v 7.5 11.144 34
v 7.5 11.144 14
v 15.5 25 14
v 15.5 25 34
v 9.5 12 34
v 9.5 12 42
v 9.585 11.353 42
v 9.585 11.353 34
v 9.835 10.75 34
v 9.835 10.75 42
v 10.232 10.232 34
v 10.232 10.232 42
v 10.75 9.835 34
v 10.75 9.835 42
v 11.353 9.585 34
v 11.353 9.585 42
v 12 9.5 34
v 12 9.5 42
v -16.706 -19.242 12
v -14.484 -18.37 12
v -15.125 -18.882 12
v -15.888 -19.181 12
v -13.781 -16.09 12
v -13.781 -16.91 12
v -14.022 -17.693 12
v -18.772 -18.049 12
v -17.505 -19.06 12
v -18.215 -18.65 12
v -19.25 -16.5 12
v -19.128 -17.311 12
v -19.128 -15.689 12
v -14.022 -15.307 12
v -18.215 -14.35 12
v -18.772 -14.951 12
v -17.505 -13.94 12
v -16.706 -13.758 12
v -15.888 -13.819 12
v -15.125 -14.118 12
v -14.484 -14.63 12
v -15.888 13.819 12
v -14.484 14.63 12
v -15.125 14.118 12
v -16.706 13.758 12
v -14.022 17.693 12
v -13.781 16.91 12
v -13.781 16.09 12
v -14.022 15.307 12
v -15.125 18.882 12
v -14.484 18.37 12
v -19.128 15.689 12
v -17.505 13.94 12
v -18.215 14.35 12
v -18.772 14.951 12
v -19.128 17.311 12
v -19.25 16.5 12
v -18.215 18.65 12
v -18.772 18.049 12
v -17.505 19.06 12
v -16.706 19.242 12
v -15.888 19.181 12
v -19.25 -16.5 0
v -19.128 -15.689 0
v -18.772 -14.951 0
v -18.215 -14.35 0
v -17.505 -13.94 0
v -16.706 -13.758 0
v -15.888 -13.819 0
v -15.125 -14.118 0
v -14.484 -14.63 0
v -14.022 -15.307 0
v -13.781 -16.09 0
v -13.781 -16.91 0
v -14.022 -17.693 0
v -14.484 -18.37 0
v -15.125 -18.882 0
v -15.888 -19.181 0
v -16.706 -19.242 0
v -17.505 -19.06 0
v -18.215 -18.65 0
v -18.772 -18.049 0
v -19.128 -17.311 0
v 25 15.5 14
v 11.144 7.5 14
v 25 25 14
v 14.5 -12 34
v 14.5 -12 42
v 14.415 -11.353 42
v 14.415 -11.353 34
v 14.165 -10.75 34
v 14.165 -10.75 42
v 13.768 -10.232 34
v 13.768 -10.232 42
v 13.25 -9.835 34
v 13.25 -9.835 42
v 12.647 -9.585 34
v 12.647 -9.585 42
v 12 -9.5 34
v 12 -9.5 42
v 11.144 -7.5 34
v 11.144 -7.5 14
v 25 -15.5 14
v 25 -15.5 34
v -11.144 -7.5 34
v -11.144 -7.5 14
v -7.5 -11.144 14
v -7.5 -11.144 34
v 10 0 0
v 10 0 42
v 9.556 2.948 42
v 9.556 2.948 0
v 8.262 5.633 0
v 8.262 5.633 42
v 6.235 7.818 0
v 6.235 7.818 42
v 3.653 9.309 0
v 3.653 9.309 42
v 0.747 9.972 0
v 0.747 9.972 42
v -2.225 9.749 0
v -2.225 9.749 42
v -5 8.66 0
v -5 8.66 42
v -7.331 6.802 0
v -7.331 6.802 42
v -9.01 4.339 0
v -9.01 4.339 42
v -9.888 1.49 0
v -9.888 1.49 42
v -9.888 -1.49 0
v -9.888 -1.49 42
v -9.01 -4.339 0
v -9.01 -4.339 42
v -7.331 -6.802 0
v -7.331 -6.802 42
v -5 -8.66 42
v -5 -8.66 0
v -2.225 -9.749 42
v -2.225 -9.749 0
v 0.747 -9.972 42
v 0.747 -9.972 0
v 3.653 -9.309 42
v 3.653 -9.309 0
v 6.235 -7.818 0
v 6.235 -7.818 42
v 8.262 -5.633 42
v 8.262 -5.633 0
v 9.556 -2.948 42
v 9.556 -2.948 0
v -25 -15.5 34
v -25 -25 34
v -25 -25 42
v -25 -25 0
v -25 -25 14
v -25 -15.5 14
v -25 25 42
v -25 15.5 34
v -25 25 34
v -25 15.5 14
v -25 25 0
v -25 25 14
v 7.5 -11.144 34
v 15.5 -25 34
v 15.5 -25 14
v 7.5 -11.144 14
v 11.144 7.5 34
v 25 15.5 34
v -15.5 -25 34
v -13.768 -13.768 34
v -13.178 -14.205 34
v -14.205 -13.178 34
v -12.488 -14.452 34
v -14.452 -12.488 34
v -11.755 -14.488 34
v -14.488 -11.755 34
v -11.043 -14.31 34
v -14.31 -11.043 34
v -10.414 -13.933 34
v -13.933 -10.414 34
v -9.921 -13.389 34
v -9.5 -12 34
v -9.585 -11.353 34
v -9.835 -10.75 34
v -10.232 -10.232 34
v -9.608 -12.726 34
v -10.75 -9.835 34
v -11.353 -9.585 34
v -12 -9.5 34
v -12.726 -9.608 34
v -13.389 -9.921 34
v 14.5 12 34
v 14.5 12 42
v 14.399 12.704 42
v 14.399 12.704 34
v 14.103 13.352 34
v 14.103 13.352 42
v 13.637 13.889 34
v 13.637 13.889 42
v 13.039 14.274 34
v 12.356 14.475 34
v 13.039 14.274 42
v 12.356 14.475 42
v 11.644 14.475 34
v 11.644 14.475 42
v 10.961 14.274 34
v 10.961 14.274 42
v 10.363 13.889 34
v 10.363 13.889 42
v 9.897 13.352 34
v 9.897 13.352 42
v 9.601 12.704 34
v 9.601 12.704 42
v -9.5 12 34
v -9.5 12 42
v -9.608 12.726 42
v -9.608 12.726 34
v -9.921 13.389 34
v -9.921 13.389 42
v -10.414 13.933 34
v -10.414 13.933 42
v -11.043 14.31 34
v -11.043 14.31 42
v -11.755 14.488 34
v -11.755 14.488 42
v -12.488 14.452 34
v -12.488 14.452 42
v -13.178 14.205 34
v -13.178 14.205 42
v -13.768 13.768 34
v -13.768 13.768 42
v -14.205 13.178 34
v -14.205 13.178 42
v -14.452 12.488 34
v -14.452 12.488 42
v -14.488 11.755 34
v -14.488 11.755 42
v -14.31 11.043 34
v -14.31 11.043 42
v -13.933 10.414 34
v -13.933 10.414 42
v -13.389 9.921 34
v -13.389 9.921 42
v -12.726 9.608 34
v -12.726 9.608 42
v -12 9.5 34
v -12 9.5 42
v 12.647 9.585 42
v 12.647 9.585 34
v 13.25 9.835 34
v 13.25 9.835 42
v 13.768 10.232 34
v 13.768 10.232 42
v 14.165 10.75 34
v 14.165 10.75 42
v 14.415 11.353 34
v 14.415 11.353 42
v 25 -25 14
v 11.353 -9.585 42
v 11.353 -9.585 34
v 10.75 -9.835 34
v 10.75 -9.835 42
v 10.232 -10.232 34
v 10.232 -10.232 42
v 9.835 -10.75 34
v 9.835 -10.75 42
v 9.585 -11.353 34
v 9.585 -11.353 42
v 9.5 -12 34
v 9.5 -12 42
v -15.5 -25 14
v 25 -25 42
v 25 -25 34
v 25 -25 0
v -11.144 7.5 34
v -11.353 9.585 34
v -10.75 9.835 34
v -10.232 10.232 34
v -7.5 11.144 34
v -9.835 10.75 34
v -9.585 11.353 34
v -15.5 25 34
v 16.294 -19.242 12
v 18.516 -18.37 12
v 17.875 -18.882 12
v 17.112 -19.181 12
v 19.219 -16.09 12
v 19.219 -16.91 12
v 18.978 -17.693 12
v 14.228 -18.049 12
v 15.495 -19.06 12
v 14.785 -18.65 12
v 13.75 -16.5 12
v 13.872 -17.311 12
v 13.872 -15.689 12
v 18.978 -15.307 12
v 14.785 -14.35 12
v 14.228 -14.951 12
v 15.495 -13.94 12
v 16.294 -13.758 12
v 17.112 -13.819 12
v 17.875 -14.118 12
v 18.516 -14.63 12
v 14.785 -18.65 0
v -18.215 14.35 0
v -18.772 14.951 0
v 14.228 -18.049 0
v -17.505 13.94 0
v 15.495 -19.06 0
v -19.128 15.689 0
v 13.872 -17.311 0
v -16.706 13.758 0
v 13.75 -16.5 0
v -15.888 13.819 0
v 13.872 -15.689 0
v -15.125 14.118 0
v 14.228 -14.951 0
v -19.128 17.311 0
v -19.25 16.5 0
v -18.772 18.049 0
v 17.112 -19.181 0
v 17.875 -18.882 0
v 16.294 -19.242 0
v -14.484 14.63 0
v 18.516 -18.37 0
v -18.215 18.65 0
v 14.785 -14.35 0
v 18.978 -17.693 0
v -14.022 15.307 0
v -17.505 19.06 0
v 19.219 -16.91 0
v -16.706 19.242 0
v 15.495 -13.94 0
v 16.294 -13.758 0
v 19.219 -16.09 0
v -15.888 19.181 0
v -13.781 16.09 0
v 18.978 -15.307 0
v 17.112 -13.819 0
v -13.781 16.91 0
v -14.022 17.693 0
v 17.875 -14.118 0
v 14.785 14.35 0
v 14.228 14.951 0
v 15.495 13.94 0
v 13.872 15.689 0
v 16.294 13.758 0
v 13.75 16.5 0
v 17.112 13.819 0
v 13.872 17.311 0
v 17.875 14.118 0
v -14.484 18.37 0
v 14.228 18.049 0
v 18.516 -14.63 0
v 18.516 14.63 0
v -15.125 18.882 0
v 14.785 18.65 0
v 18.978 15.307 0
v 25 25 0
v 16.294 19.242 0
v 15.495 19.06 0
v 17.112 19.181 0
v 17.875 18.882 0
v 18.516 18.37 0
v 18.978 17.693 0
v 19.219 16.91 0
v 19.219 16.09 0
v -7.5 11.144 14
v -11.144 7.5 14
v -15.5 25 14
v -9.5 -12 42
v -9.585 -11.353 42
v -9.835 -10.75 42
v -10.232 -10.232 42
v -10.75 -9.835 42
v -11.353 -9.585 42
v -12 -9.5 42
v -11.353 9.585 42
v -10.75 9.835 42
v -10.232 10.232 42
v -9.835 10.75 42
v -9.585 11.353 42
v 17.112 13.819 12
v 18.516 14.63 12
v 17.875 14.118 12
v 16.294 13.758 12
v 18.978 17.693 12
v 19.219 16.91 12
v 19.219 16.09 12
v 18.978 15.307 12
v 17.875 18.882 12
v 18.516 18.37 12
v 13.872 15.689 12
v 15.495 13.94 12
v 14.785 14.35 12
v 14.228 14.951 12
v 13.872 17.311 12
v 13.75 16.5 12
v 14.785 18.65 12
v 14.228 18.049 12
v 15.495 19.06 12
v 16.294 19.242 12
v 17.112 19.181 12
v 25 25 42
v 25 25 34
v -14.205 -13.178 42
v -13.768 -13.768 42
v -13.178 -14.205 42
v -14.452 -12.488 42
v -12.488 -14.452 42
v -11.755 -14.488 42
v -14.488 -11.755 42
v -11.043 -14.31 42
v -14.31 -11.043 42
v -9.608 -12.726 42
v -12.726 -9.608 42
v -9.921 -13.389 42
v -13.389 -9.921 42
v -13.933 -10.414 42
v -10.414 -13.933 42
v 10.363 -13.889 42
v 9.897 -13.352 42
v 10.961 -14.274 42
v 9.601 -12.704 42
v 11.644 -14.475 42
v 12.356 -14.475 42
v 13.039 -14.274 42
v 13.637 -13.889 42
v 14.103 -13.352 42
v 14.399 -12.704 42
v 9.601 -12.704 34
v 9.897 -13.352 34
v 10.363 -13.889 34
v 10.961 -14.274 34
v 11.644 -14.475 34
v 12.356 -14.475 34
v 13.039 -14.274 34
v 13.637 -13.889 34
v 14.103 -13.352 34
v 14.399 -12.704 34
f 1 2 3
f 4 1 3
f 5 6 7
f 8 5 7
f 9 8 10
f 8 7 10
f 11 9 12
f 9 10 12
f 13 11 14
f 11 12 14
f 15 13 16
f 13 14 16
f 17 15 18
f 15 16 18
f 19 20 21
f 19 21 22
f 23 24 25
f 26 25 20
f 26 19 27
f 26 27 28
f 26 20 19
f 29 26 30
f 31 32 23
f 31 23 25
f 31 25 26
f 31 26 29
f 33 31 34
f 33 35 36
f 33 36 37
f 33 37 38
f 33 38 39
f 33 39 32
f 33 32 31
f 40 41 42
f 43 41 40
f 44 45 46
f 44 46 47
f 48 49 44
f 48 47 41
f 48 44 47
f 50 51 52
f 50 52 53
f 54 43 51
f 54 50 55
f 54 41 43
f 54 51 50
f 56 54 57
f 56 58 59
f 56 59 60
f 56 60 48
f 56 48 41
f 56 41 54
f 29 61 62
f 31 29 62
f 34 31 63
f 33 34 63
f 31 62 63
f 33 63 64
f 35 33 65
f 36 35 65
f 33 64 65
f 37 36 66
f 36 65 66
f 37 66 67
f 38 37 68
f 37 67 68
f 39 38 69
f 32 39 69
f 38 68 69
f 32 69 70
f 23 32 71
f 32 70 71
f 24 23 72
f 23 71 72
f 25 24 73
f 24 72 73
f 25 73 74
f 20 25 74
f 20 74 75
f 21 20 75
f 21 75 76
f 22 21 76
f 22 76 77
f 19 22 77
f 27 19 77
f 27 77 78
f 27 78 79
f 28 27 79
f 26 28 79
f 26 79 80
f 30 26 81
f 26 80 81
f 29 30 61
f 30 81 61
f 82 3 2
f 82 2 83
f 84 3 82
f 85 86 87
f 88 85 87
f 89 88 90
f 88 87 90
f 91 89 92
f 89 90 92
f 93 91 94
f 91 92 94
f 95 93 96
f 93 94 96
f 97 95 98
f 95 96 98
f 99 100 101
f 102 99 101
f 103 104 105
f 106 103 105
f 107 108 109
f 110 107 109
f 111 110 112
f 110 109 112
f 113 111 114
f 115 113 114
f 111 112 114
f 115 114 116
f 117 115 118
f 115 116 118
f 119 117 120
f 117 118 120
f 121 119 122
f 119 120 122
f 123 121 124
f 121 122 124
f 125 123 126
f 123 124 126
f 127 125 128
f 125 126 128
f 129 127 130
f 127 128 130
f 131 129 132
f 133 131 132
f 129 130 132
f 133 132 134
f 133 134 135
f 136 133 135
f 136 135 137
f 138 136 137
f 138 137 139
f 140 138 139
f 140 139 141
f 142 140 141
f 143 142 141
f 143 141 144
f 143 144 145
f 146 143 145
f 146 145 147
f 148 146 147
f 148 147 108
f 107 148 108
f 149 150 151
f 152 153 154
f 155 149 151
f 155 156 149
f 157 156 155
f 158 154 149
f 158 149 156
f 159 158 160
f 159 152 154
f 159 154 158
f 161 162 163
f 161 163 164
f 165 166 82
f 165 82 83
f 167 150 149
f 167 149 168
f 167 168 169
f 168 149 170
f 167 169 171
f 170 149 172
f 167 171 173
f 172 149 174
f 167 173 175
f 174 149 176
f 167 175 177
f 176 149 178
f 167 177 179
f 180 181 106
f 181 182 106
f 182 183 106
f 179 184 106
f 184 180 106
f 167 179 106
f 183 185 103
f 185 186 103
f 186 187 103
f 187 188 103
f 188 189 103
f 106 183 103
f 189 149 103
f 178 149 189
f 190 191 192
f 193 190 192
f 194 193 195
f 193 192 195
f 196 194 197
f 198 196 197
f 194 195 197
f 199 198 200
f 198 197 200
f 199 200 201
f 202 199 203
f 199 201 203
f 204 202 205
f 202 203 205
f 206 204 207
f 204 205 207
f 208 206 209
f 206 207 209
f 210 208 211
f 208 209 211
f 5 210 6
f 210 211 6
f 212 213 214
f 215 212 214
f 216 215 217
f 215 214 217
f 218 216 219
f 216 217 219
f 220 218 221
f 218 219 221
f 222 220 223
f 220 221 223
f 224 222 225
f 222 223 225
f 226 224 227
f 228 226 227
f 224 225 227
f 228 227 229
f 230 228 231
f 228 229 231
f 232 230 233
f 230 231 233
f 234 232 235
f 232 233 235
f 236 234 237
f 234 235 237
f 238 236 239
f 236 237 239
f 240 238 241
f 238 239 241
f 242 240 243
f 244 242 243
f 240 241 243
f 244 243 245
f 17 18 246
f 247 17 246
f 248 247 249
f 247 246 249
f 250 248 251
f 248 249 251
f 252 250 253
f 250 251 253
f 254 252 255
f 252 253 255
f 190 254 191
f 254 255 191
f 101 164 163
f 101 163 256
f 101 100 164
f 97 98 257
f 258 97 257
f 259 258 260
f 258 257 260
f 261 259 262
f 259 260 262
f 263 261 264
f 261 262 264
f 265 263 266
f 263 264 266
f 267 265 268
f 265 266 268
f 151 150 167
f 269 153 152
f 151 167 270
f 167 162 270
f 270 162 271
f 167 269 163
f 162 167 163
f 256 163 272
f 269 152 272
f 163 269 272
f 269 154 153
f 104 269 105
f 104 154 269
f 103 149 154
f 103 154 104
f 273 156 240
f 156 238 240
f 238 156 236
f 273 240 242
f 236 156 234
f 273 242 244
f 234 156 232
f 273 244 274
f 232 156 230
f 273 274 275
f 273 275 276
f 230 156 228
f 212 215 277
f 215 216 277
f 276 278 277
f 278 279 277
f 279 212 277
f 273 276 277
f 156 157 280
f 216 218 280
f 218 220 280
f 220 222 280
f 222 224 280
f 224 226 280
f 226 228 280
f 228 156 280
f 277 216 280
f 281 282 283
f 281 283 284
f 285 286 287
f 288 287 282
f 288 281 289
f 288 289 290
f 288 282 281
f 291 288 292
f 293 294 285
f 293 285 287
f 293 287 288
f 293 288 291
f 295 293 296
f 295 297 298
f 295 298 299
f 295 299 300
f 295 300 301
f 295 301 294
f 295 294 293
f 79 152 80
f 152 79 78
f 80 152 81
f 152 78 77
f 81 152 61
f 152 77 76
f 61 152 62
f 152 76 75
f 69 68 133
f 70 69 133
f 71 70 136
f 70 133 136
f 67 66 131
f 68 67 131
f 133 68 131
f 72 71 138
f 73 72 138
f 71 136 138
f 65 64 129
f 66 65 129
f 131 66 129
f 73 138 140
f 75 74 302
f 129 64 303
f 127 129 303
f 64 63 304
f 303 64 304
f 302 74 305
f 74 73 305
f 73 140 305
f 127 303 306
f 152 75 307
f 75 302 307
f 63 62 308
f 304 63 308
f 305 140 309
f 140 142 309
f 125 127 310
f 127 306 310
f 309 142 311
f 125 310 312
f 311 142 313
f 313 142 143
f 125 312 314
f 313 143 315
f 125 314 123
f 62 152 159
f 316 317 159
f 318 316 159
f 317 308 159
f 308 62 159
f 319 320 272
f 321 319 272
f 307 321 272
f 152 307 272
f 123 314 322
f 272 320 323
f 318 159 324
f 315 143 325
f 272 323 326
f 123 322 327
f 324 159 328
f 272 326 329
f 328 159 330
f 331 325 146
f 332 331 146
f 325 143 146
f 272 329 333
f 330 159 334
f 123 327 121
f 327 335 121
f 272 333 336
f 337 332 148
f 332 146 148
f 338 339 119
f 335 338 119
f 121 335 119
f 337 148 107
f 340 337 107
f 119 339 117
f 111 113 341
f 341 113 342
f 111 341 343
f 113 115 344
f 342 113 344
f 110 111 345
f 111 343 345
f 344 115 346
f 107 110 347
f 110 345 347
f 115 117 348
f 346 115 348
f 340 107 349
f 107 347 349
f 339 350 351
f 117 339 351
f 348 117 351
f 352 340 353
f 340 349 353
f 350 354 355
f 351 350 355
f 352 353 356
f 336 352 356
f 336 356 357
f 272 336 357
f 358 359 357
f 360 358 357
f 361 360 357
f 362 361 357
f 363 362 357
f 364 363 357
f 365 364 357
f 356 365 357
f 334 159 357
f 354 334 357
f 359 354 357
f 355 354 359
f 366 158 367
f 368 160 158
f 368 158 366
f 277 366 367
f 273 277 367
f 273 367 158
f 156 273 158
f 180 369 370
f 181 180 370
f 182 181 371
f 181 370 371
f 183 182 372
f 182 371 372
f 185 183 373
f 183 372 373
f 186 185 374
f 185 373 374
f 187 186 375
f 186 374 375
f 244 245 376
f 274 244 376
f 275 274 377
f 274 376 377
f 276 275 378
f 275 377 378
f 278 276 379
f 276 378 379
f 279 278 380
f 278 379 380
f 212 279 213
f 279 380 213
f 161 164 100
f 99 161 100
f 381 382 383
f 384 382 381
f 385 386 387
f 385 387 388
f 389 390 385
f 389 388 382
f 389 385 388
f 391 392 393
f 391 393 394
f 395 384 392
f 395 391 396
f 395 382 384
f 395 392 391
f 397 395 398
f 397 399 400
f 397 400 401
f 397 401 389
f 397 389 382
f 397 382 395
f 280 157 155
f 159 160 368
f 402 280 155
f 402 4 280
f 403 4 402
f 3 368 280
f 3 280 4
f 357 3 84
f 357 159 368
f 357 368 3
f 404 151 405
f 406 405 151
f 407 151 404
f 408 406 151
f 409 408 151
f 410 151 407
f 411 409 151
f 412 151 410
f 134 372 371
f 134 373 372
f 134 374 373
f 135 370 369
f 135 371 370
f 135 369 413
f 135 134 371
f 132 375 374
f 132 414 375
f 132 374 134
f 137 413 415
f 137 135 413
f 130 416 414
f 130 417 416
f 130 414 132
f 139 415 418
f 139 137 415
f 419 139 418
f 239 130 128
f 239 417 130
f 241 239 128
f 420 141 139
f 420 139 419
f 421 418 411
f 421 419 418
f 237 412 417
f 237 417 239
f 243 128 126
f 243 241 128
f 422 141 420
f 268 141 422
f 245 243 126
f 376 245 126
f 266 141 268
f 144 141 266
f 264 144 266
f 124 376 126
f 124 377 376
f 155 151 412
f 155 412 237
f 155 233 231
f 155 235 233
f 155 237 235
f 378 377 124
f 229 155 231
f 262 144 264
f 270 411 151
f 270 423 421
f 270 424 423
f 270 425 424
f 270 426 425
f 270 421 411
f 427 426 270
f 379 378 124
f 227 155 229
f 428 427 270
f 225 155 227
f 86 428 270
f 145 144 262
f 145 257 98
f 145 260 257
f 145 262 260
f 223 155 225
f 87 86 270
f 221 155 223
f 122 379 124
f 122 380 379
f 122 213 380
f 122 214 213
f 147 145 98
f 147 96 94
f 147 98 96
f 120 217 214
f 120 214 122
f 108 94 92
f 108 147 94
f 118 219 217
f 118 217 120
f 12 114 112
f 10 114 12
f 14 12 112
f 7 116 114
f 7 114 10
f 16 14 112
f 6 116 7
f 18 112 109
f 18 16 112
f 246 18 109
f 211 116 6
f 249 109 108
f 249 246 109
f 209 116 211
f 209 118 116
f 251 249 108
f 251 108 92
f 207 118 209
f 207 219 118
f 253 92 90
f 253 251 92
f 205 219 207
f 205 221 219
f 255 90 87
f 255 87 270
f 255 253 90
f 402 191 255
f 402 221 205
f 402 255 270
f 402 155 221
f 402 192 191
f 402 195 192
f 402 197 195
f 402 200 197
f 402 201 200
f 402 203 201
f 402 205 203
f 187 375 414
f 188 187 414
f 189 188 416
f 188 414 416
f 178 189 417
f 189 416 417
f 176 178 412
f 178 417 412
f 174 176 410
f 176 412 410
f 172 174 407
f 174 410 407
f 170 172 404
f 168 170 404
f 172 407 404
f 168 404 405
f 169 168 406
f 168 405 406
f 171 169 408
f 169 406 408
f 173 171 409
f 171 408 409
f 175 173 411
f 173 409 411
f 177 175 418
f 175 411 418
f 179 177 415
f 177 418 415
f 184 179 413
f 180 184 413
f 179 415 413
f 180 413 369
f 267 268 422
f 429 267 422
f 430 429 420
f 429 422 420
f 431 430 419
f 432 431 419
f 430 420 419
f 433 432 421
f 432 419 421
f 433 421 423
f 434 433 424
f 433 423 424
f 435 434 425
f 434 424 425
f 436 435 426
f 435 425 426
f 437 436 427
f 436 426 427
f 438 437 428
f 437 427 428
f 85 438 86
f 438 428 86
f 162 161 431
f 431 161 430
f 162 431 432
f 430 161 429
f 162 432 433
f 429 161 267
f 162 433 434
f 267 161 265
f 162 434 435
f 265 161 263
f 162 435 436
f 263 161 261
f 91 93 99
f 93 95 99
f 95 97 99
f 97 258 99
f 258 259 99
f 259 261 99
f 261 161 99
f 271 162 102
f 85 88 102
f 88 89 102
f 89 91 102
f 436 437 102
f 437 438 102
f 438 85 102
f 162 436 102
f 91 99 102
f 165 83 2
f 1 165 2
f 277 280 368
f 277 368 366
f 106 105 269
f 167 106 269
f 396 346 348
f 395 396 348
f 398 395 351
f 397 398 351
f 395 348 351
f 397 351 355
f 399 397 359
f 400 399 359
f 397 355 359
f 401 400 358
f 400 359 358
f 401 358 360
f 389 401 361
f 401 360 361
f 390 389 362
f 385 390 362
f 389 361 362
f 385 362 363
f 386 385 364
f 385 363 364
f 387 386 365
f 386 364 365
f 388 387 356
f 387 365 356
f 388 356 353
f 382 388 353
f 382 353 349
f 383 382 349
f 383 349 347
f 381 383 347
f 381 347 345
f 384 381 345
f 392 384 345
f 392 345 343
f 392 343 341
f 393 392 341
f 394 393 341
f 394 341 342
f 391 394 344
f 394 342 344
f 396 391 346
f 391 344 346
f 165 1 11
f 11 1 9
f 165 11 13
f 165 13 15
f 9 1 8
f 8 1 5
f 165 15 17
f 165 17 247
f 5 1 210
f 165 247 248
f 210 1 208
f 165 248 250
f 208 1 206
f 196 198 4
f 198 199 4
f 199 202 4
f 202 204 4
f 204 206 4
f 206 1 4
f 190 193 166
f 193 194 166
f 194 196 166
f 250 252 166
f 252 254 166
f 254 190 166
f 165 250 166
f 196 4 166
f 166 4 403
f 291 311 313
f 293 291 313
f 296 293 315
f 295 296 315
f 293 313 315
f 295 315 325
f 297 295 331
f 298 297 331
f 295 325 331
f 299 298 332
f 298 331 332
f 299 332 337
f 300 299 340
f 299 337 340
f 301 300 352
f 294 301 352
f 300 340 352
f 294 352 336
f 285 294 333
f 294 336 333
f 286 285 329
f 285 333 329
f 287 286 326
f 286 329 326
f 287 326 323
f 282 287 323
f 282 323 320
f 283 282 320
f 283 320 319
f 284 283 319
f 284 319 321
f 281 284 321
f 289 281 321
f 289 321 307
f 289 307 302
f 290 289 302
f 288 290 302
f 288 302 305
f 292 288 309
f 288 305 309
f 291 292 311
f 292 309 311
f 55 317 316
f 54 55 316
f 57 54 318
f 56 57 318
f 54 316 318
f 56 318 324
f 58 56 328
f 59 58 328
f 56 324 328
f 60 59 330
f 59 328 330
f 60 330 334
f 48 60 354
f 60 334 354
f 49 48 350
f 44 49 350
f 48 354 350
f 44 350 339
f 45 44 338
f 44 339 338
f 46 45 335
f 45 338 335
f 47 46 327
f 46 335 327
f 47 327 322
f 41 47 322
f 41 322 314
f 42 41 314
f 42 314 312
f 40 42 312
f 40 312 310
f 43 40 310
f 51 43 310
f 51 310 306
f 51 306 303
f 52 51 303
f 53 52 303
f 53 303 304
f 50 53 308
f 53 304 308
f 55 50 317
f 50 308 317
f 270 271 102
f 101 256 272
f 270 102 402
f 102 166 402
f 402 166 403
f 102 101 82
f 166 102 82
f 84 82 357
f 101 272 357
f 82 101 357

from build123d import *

# Parameters (mm, degrees)
SKETCH2_W           = 50
SKETCH2_H           = 50
BOSS_EXTRUDE2_DEPTH = 14
SKETCH4_R           = 2.75
CUT_EXTRUDE1_DEPTH  = 12
BOSS_EXTRUDE3_DEPTH = 20
SKETCH8_W           = 50
SKETCH8_H           = 50
BOSS_EXTRUDE4_DEPTH = 8
CUT_EXTRUDE3_REACH  = 56.9
CUT_EXTRUDE4_REACH  = 56.9
SKETCH10_R          = 10


with BuildPart() as part:
    # Sketch2 → Boss-Extrude2 (new body)
    with BuildSketch(Plane.XY):
        Rectangle(SKETCH2_W, SKETCH2_H)
    extrude(amount=BOSS_EXTRUDE2_DEPTH)

    # Sketch4 → Cut-Extrude1 (cut)
    with BuildSketch(Plane(origin=(0, 0, 0), x_dir=(-1, 0, 0), z_dir=(0, 0, -1))):
        with Locations((-16.5, 16.5)):
            Circle(SKETCH4_R)
        with Locations((16.5, 16.5)):
            Circle(SKETCH4_R)
        with Locations((16.5, -16.5)):
            Circle(SKETCH4_R)
        with Locations((-16.5, -16.5)):
            Circle(SKETCH4_R)
    extrude(amount=-CUT_EXTRUDE1_DEPTH, mode=Mode.SUBTRACT)

    # Sketch5 → Boss-Extrude3 (add)
    with BuildSketch(Plane.XY.offset(14)):
        Polygon((25, 15.5), (11.143593539, 7.5), (7.5, 11.143593539), (15.5, 25), (-15.5, 25), (-7.5, 11.143593539), (-11.143593539, 7.5), (-25, 15.5), (-25, -15.5), (-11.143593539, -7.5), (-7.5, -11.143593539), (-15.5, -25), (15.5, -25), (7.5, -11.143593539), (11.143593539, -7.5), (25, -15.5), align=None)
    extrude(amount=BOSS_EXTRUDE3_DEPTH)

    # Sketch8 → Boss-Extrude4 (add)
    with BuildSketch(Plane.XY.offset(34)):
        Rectangle(SKETCH8_W, SKETCH8_H)
    extrude(amount=BOSS_EXTRUDE4_DEPTH)

    # Sketch9 → Cut-Extrude3 (cut, up to next)
    with BuildSketch(Plane.XY.offset(42), mode=Mode.PRIVATE) as cut_extrude3_sk1:
        with BuildLine():
            ThreePointArc((14.5, 12), (12, 14.5), (9.5, 12))
            Line((9.5, 12), (12, 12))
            Line((12, 12), (12, 9.5))
            ThreePointArc((12, 9.5), (13.767766953, 10.232233047), (14.5, 12))
        make_face()
    cut_extrude3_tool1 = extrude(cut_extrude3_sk1.sketch, amount=-CUT_EXTRUDE3_REACH, mode=Mode.PRIVATE) & part.part
    # Sketch9 → Cut-Extrude3 (cut, up to next)
    with BuildSketch(Plane.XY.offset(42), mode=Mode.PRIVATE) as cut_extrude3_sk2:
        with BuildLine():
            Line((12, 12), (9.5, 12))
            ThreePointArc((9.5, 12), (10.232233047, 10.232233047), (12, 9.5))
            Line((12, 9.5), (12, 12))
        make_face()
    cut_extrude3_tool2 = extrude(cut_extrude3_sk2.sketch, amount=-CUT_EXTRUDE3_REACH, mode=Mode.PRIVATE) & part.part
    # Sketch9 → Cut-Extrude3 (cut, up to next)
    with BuildSketch(Plane.XY.offset(42), mode=Mode.PRIVATE) as cut_extrude3_sk3:
        with BuildLine():
            ThreePointArc((14.5, 12), (12, 14.5), (9.5, 12))
            Line((9.5, 12), (12, 12))
            Line((12, 12), (12, 9.5))
            ThreePointArc((12, 9.5), (13.767766953, 10.232233047), (14.5, 12))
        make_face()
    cut_extrude3_tool3 = extrude(cut_extrude3_sk3.sketch, amount=-CUT_EXTRUDE3_REACH, mode=Mode.PRIVATE) & part.part
    # Sketch9 → Cut-Extrude3 (cut, up to next)
    with BuildSketch(Plane.XY.offset(42), mode=Mode.PRIVATE) as cut_extrude3_sk4:
        with BuildLine():
            Line((12, 12), (9.5, 12))
            ThreePointArc((9.5, 12), (10.232233047, 10.232233047), (12, 9.5))
            Line((12, 9.5), (12, 12))
        make_face()
    cut_extrude3_tool4 = extrude(cut_extrude3_sk4.sketch, amount=-CUT_EXTRUDE3_REACH, mode=Mode.PRIVATE) & part.part
    # Sketch9 → Cut-Extrude3 (cut, up to next)
    with BuildSketch(Plane.XY.offset(42), mode=Mode.PRIVATE) as cut_extrude3_sk5:
        with BuildLine():
            ThreePointArc((14.5, -12), (13.767766953, -10.232233047), (12, -9.5))
            Line((12, -9.5), (12, -12))
            Line((12, -12), (9.5, -12))
            ThreePointArc((9.5, -12), (12, -14.5), (14.5, -12))
        make_face()
    cut_extrude3_tool5 = extrude(cut_extrude3_sk5.sketch, amount=-CUT_EXTRUDE3_REACH, mode=Mode.PRIVATE) & part.part
    # Sketch9 → Cut-Extrude3 (cut, up to next)
    with BuildSketch(Plane.XY.offset(42), mode=Mode.PRIVATE) as cut_extrude3_sk6:
        with BuildLine():
            Line((12, -12), (12, -9.5))
            ThreePointArc((12, -9.5), (10.232233047, -10.232233047), (9.5, -12))
            Line((9.5, -12), (12, -12))
        make_face()
    cut_extrude3_tool6 = extrude(cut_extrude3_sk6.sketch, amount=-CUT_EXTRUDE3_REACH, mode=Mode.PRIVATE) & part.part
    # Sketch9 → Cut-Extrude3 (cut, up to next)
    with BuildSketch(Plane.XY.offset(42), mode=Mode.PRIVATE) as cut_extrude3_sk7:
        with BuildLine():
            ThreePointArc((14.5, -12), (13.767766953, -10.232233047), (12, -9.5))
            Line((12, -9.5), (12, -12))
            Line((12, -12), (9.5, -12))
            ThreePointArc((9.5, -12), (12, -14.5), (14.5, -12))
        make_face()
    cut_extrude3_tool7 = extrude(cut_extrude3_sk7.sketch, amount=-CUT_EXTRUDE3_REACH, mode=Mode.PRIVATE) & part.part
    # Sketch9 → Cut-Extrude3 (cut, up to next)
    with BuildSketch(Plane.XY.offset(42), mode=Mode.PRIVATE) as cut_extrude3_sk8:
        with BuildLine():
            Line((12, -12), (12, -9.5))
            ThreePointArc((12, -9.5), (10.232233047, -10.232233047), (9.5, -12))
            Line((9.5, -12), (12, -12))
        make_face()
    cut_extrude3_tool8 = extrude(cut_extrude3_sk8.sketch, amount=-CUT_EXTRUDE3_REACH, mode=Mode.PRIVATE) & part.part
    # Sketch9 → Cut-Extrude3 (cut, up to next)
    with BuildSketch(Plane.XY.offset(42), mode=Mode.PRIVATE) as cut_extrude3_sk9:
        with BuildLine():
            ThreePointArc((-9.5, -12), (-10.232233047, -10.232233047), (-12, -9.5))
            Line((-12, -9.5), (-12, -12))
            Line((-12, -12), (-9.5, -12))
        make_face()
    cut_extrude3_tool9 = extrude(cut_extrude3_sk9.sketch, amount=-CUT_EXTRUDE3_REACH, mode=Mode.PRIVATE) & part.part
    # Sketch9 → Cut-Extrude3 (cut, up to next)
    with BuildSketch(Plane.XY.offset(42), mode=Mode.PRIVATE) as cut_extrude3_sk10:
        with BuildLine():
            Line((-12, -12), (-12, -9.5))
            ThreePointArc((-12, -9.5), (-13.767766953, -13.767766953), (-9.5, -12))
            Line((-9.5, -12), (-12, -12))
        make_face()
    cut_extrude3_tool10 = extrude(cut_extrude3_sk10.sketch, amount=-CUT_EXTRUDE3_REACH, mode=Mode.PRIVATE) & part.part
    # Sketch9 → Cut-Extrude3 (cut, up to next)
    with BuildSketch(Plane.XY.offset(42), mode=Mode.PRIVATE) as cut_extrude3_sk11:
        with BuildLine():
            ThreePointArc((-9.5, -12), (-10.232233047, -10.232233047), (-12, -9.5))
            Line((-12, -9.5), (-12, -12))
            Line((-12, -12), (-9.5, -12))
        make_face()
    cut_extrude3_tool11 = extrude(cut_extrude3_sk11.sketch, amount=-CUT_EXTRUDE3_REACH, mode=Mode.PRIVATE) & part.part
    # Sketch9 → Cut-Extrude3 (cut, up to next)
    with BuildSketch(Plane.XY.offset(42), mode=Mode.PRIVATE) as cut_extrude3_sk12:
        with BuildLine():
            Line((-12, -12), (-12, -9.5))
            ThreePointArc((-12, -9.5), (-13.767766953, -13.767766953), (-9.5, -12))
            Line((-9.5, -12), (-12, -12))
        make_face()
    cut_extrude3_tool12 = extrude(cut_extrude3_sk12.sketch, amount=-CUT_EXTRUDE3_REACH, mode=Mode.PRIVATE) & part.part
    # Sketch9 → Cut-Extrude3 (cut, up to next)
    with BuildSketch(Plane.XY.offset(42), mode=Mode.PRIVATE) as cut_extrude3_sk13:
        with BuildLine():
            Line((-12, 9.5), (-12, 12))
            Line((-12, 12), (-9.5, 12))
            ThreePointArc((-9.5, 12), (-13.767766953, 13.767766953), (-12, 9.5))
        make_face()
    cut_extrude3_tool13 = extrude(cut_extrude3_sk13.sketch, amount=-CUT_EXTRUDE3_REACH, mode=Mode.PRIVATE) & part.part
    # Sketch9 → Cut-Extrude3 (cut, up to next)
    with BuildSketch(Plane.XY.offset(42), mode=Mode.PRIVATE) as cut_extrude3_sk14:
        with BuildLine():
            Line((-9.5, 12), (-12, 12))
            Line((-12, 12), (-12, 9.5))
            ThreePointArc((-12, 9.5), (-10.232233047, 10.232233047), (-9.5, 12))
        make_face()
    cut_extrude3_tool14 = extrude(cut_extrude3_sk14.sketch, amount=-CUT_EXTRUDE3_REACH, mode=Mode.PRIVATE) & part.part
    # Sketch9 → Cut-Extrude3 (cut, up to next)
    with BuildSketch(Plane.XY.offset(42), mode=Mode.PRIVATE) as cut_extrude3_sk15:
        with BuildLine():
            Line((-12, 9.5), (-12, 12))
            Line((-12, 12), (-9.5, 12))
            ThreePointArc((-9.5, 12), (-13.767766953, 13.767766953), (-12, 9.5))
        make_face()
    cut_extrude3_tool15 = extrude(cut_extrude3_sk15.sketch, amount=-CUT_EXTRUDE3_REACH, mode=Mode.PRIVATE) & part.part
    # Sketch9 → Cut-Extrude3 (cut, up to next)
    with BuildSketch(Plane.XY.offset(42), mode=Mode.PRIVATE) as cut_extrude3_sk16:
        with BuildLine():
            Line((-9.5, 12), (-12, 12))
            Line((-12, 12), (-12, 9.5))
            ThreePointArc((-12, 9.5), (-10.232233047, 10.232233047), (-9.5, 12))
        make_face()
    cut_extrude3_tool16 = extrude(cut_extrude3_sk16.sketch, amount=-CUT_EXTRUDE3_REACH, mode=Mode.PRIVATE) & part.part
    add(cut_extrude3_tool1.solids().sort_by_distance((12.353678, 12.353678, 42))[0], mode=Mode.SUBTRACT)
    add(cut_extrude3_tool2.solids().sort_by_distance((10.938967, 10.938967, 42))[0], mode=Mode.SUBTRACT)
    add(cut_extrude3_tool3.solids().sort_by_distance((12.353678, 12.353678, 42))[0], mode=Mode.SUBTRACT)
    add(cut_extrude3_tool4.solids().sort_by_distance((10.938967, 10.938967, 42))[0], mode=Mode.SUBTRACT)
    add(cut_extrude3_tool5.solids().sort_by_distance((12.353678, -12.353678, 42))[0], mode=Mode.SUBTRACT)
    add(cut_extrude3_tool6.solids().sort_by_distance((10.938967, -10.938967, 42))[0], mode=Mode.SUBTRACT)
    add(cut_extrude3_tool7.solids().sort_by_distance((12.353678, -12.353678, 42))[0], mode=Mode.SUBTRACT)
    add(cut_extrude3_tool8.solids().sort_by_distance((10.938967, -10.938967, 42))[0], mode=Mode.SUBTRACT)
    add(cut_extrude3_tool9.solids().sort_by_distance((-10.938967, -10.938967, 42))[0], mode=Mode.SUBTRACT)
    add(cut_extrude3_tool10.solids().sort_by_distance((-12.353678, -12.353678, 42))[0], mode=Mode.SUBTRACT)
    add(cut_extrude3_tool11.solids().sort_by_distance((-10.938967, -10.938967, 42))[0], mode=Mode.SUBTRACT)
    add(cut_extrude3_tool12.solids().sort_by_distance((-12.353678, -12.353678, 42))[0], mode=Mode.SUBTRACT)
    add(cut_extrude3_tool13.solids().sort_by_distance((-12.353678, 12.353678, 42))[0], mode=Mode.SUBTRACT)
    add(cut_extrude3_tool14.solids().sort_by_distance((-10.938967, 10.938967, 42))[0], mode=Mode.SUBTRACT)
    add(cut_extrude3_tool15.solids().sort_by_distance((-12.353678, 12.353678, 42))[0], mode=Mode.SUBTRACT)
    add(cut_extrude3_tool16.solids().sort_by_distance((-10.938967, 10.938967, 42))[0], mode=Mode.SUBTRACT)

    # Sketch10 → Cut-Extrude4 (cut, up to next)
    with BuildSketch(Plane.XY.offset(42), mode=Mode.PRIVATE) as cut_extrude4_sk1:
        Circle(SKETCH10_R)
    cut_extrude4_tool1 = extrude(cut_extrude4_sk1.sketch, amount=-CUT_EXTRUDE4_REACH, mode=Mode.PRIVATE) & part.part
    add(cut_extrude4_tool1.solids().sort_by_distance((0, 0, 42))[0], mode=Mode.SUBTRACT)


solid = part.part
